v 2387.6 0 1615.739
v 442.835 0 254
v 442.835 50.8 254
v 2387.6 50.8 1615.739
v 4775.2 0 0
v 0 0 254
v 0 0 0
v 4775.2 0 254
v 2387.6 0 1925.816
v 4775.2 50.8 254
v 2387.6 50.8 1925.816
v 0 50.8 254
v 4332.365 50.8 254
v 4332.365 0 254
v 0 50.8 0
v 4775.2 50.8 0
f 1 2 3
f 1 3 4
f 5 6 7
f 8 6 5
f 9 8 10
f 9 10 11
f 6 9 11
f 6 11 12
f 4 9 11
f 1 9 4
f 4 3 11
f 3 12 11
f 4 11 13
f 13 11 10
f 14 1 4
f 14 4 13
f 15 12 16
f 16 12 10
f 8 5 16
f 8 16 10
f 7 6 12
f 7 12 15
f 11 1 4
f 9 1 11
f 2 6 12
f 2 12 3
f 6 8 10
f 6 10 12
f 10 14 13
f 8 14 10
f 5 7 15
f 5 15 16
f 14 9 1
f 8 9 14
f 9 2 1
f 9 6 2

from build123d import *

# Parameters (mm, degrees)
F1_DEPTH = 50.8
F2_DEPTH = 50.8
F3_DEPTH = 50.8


with BuildPart() as f1:
    # F0 (on Front) → F1 (new body)
    with BuildSketch(Plane.XZ):
        Polygon((0, 254), (0, 0), (4775.2, 0), (4775.2, 254), (4332.364514, 254), (442.835486, 254), align=None)
    extrude(amount=-F1_DEPTH)


with BuildPart() as f2:
    # F0 (on Front) → F2 (new body)
    with BuildSketch(Plane.XZ):
        Polygon((2387.6, 1925.815518), (0, 254), (442.835486, 254), (2387.6, 1615.738773), align=None)
    extrude(amount=-F2_DEPTH)


with BuildPart() as f3:
    # F0 (on Front) → F3 (new body)
    with BuildSketch(Plane.XZ):
        Polygon((4332.364514, 254), (4775.2, 254), (2387.6, 1925.815518), (2387.6, 1615.738773), align=None)
    extrude(amount=-F3_DEPTH)


solid = Compound([f1.part, f2.part, f3.part])
